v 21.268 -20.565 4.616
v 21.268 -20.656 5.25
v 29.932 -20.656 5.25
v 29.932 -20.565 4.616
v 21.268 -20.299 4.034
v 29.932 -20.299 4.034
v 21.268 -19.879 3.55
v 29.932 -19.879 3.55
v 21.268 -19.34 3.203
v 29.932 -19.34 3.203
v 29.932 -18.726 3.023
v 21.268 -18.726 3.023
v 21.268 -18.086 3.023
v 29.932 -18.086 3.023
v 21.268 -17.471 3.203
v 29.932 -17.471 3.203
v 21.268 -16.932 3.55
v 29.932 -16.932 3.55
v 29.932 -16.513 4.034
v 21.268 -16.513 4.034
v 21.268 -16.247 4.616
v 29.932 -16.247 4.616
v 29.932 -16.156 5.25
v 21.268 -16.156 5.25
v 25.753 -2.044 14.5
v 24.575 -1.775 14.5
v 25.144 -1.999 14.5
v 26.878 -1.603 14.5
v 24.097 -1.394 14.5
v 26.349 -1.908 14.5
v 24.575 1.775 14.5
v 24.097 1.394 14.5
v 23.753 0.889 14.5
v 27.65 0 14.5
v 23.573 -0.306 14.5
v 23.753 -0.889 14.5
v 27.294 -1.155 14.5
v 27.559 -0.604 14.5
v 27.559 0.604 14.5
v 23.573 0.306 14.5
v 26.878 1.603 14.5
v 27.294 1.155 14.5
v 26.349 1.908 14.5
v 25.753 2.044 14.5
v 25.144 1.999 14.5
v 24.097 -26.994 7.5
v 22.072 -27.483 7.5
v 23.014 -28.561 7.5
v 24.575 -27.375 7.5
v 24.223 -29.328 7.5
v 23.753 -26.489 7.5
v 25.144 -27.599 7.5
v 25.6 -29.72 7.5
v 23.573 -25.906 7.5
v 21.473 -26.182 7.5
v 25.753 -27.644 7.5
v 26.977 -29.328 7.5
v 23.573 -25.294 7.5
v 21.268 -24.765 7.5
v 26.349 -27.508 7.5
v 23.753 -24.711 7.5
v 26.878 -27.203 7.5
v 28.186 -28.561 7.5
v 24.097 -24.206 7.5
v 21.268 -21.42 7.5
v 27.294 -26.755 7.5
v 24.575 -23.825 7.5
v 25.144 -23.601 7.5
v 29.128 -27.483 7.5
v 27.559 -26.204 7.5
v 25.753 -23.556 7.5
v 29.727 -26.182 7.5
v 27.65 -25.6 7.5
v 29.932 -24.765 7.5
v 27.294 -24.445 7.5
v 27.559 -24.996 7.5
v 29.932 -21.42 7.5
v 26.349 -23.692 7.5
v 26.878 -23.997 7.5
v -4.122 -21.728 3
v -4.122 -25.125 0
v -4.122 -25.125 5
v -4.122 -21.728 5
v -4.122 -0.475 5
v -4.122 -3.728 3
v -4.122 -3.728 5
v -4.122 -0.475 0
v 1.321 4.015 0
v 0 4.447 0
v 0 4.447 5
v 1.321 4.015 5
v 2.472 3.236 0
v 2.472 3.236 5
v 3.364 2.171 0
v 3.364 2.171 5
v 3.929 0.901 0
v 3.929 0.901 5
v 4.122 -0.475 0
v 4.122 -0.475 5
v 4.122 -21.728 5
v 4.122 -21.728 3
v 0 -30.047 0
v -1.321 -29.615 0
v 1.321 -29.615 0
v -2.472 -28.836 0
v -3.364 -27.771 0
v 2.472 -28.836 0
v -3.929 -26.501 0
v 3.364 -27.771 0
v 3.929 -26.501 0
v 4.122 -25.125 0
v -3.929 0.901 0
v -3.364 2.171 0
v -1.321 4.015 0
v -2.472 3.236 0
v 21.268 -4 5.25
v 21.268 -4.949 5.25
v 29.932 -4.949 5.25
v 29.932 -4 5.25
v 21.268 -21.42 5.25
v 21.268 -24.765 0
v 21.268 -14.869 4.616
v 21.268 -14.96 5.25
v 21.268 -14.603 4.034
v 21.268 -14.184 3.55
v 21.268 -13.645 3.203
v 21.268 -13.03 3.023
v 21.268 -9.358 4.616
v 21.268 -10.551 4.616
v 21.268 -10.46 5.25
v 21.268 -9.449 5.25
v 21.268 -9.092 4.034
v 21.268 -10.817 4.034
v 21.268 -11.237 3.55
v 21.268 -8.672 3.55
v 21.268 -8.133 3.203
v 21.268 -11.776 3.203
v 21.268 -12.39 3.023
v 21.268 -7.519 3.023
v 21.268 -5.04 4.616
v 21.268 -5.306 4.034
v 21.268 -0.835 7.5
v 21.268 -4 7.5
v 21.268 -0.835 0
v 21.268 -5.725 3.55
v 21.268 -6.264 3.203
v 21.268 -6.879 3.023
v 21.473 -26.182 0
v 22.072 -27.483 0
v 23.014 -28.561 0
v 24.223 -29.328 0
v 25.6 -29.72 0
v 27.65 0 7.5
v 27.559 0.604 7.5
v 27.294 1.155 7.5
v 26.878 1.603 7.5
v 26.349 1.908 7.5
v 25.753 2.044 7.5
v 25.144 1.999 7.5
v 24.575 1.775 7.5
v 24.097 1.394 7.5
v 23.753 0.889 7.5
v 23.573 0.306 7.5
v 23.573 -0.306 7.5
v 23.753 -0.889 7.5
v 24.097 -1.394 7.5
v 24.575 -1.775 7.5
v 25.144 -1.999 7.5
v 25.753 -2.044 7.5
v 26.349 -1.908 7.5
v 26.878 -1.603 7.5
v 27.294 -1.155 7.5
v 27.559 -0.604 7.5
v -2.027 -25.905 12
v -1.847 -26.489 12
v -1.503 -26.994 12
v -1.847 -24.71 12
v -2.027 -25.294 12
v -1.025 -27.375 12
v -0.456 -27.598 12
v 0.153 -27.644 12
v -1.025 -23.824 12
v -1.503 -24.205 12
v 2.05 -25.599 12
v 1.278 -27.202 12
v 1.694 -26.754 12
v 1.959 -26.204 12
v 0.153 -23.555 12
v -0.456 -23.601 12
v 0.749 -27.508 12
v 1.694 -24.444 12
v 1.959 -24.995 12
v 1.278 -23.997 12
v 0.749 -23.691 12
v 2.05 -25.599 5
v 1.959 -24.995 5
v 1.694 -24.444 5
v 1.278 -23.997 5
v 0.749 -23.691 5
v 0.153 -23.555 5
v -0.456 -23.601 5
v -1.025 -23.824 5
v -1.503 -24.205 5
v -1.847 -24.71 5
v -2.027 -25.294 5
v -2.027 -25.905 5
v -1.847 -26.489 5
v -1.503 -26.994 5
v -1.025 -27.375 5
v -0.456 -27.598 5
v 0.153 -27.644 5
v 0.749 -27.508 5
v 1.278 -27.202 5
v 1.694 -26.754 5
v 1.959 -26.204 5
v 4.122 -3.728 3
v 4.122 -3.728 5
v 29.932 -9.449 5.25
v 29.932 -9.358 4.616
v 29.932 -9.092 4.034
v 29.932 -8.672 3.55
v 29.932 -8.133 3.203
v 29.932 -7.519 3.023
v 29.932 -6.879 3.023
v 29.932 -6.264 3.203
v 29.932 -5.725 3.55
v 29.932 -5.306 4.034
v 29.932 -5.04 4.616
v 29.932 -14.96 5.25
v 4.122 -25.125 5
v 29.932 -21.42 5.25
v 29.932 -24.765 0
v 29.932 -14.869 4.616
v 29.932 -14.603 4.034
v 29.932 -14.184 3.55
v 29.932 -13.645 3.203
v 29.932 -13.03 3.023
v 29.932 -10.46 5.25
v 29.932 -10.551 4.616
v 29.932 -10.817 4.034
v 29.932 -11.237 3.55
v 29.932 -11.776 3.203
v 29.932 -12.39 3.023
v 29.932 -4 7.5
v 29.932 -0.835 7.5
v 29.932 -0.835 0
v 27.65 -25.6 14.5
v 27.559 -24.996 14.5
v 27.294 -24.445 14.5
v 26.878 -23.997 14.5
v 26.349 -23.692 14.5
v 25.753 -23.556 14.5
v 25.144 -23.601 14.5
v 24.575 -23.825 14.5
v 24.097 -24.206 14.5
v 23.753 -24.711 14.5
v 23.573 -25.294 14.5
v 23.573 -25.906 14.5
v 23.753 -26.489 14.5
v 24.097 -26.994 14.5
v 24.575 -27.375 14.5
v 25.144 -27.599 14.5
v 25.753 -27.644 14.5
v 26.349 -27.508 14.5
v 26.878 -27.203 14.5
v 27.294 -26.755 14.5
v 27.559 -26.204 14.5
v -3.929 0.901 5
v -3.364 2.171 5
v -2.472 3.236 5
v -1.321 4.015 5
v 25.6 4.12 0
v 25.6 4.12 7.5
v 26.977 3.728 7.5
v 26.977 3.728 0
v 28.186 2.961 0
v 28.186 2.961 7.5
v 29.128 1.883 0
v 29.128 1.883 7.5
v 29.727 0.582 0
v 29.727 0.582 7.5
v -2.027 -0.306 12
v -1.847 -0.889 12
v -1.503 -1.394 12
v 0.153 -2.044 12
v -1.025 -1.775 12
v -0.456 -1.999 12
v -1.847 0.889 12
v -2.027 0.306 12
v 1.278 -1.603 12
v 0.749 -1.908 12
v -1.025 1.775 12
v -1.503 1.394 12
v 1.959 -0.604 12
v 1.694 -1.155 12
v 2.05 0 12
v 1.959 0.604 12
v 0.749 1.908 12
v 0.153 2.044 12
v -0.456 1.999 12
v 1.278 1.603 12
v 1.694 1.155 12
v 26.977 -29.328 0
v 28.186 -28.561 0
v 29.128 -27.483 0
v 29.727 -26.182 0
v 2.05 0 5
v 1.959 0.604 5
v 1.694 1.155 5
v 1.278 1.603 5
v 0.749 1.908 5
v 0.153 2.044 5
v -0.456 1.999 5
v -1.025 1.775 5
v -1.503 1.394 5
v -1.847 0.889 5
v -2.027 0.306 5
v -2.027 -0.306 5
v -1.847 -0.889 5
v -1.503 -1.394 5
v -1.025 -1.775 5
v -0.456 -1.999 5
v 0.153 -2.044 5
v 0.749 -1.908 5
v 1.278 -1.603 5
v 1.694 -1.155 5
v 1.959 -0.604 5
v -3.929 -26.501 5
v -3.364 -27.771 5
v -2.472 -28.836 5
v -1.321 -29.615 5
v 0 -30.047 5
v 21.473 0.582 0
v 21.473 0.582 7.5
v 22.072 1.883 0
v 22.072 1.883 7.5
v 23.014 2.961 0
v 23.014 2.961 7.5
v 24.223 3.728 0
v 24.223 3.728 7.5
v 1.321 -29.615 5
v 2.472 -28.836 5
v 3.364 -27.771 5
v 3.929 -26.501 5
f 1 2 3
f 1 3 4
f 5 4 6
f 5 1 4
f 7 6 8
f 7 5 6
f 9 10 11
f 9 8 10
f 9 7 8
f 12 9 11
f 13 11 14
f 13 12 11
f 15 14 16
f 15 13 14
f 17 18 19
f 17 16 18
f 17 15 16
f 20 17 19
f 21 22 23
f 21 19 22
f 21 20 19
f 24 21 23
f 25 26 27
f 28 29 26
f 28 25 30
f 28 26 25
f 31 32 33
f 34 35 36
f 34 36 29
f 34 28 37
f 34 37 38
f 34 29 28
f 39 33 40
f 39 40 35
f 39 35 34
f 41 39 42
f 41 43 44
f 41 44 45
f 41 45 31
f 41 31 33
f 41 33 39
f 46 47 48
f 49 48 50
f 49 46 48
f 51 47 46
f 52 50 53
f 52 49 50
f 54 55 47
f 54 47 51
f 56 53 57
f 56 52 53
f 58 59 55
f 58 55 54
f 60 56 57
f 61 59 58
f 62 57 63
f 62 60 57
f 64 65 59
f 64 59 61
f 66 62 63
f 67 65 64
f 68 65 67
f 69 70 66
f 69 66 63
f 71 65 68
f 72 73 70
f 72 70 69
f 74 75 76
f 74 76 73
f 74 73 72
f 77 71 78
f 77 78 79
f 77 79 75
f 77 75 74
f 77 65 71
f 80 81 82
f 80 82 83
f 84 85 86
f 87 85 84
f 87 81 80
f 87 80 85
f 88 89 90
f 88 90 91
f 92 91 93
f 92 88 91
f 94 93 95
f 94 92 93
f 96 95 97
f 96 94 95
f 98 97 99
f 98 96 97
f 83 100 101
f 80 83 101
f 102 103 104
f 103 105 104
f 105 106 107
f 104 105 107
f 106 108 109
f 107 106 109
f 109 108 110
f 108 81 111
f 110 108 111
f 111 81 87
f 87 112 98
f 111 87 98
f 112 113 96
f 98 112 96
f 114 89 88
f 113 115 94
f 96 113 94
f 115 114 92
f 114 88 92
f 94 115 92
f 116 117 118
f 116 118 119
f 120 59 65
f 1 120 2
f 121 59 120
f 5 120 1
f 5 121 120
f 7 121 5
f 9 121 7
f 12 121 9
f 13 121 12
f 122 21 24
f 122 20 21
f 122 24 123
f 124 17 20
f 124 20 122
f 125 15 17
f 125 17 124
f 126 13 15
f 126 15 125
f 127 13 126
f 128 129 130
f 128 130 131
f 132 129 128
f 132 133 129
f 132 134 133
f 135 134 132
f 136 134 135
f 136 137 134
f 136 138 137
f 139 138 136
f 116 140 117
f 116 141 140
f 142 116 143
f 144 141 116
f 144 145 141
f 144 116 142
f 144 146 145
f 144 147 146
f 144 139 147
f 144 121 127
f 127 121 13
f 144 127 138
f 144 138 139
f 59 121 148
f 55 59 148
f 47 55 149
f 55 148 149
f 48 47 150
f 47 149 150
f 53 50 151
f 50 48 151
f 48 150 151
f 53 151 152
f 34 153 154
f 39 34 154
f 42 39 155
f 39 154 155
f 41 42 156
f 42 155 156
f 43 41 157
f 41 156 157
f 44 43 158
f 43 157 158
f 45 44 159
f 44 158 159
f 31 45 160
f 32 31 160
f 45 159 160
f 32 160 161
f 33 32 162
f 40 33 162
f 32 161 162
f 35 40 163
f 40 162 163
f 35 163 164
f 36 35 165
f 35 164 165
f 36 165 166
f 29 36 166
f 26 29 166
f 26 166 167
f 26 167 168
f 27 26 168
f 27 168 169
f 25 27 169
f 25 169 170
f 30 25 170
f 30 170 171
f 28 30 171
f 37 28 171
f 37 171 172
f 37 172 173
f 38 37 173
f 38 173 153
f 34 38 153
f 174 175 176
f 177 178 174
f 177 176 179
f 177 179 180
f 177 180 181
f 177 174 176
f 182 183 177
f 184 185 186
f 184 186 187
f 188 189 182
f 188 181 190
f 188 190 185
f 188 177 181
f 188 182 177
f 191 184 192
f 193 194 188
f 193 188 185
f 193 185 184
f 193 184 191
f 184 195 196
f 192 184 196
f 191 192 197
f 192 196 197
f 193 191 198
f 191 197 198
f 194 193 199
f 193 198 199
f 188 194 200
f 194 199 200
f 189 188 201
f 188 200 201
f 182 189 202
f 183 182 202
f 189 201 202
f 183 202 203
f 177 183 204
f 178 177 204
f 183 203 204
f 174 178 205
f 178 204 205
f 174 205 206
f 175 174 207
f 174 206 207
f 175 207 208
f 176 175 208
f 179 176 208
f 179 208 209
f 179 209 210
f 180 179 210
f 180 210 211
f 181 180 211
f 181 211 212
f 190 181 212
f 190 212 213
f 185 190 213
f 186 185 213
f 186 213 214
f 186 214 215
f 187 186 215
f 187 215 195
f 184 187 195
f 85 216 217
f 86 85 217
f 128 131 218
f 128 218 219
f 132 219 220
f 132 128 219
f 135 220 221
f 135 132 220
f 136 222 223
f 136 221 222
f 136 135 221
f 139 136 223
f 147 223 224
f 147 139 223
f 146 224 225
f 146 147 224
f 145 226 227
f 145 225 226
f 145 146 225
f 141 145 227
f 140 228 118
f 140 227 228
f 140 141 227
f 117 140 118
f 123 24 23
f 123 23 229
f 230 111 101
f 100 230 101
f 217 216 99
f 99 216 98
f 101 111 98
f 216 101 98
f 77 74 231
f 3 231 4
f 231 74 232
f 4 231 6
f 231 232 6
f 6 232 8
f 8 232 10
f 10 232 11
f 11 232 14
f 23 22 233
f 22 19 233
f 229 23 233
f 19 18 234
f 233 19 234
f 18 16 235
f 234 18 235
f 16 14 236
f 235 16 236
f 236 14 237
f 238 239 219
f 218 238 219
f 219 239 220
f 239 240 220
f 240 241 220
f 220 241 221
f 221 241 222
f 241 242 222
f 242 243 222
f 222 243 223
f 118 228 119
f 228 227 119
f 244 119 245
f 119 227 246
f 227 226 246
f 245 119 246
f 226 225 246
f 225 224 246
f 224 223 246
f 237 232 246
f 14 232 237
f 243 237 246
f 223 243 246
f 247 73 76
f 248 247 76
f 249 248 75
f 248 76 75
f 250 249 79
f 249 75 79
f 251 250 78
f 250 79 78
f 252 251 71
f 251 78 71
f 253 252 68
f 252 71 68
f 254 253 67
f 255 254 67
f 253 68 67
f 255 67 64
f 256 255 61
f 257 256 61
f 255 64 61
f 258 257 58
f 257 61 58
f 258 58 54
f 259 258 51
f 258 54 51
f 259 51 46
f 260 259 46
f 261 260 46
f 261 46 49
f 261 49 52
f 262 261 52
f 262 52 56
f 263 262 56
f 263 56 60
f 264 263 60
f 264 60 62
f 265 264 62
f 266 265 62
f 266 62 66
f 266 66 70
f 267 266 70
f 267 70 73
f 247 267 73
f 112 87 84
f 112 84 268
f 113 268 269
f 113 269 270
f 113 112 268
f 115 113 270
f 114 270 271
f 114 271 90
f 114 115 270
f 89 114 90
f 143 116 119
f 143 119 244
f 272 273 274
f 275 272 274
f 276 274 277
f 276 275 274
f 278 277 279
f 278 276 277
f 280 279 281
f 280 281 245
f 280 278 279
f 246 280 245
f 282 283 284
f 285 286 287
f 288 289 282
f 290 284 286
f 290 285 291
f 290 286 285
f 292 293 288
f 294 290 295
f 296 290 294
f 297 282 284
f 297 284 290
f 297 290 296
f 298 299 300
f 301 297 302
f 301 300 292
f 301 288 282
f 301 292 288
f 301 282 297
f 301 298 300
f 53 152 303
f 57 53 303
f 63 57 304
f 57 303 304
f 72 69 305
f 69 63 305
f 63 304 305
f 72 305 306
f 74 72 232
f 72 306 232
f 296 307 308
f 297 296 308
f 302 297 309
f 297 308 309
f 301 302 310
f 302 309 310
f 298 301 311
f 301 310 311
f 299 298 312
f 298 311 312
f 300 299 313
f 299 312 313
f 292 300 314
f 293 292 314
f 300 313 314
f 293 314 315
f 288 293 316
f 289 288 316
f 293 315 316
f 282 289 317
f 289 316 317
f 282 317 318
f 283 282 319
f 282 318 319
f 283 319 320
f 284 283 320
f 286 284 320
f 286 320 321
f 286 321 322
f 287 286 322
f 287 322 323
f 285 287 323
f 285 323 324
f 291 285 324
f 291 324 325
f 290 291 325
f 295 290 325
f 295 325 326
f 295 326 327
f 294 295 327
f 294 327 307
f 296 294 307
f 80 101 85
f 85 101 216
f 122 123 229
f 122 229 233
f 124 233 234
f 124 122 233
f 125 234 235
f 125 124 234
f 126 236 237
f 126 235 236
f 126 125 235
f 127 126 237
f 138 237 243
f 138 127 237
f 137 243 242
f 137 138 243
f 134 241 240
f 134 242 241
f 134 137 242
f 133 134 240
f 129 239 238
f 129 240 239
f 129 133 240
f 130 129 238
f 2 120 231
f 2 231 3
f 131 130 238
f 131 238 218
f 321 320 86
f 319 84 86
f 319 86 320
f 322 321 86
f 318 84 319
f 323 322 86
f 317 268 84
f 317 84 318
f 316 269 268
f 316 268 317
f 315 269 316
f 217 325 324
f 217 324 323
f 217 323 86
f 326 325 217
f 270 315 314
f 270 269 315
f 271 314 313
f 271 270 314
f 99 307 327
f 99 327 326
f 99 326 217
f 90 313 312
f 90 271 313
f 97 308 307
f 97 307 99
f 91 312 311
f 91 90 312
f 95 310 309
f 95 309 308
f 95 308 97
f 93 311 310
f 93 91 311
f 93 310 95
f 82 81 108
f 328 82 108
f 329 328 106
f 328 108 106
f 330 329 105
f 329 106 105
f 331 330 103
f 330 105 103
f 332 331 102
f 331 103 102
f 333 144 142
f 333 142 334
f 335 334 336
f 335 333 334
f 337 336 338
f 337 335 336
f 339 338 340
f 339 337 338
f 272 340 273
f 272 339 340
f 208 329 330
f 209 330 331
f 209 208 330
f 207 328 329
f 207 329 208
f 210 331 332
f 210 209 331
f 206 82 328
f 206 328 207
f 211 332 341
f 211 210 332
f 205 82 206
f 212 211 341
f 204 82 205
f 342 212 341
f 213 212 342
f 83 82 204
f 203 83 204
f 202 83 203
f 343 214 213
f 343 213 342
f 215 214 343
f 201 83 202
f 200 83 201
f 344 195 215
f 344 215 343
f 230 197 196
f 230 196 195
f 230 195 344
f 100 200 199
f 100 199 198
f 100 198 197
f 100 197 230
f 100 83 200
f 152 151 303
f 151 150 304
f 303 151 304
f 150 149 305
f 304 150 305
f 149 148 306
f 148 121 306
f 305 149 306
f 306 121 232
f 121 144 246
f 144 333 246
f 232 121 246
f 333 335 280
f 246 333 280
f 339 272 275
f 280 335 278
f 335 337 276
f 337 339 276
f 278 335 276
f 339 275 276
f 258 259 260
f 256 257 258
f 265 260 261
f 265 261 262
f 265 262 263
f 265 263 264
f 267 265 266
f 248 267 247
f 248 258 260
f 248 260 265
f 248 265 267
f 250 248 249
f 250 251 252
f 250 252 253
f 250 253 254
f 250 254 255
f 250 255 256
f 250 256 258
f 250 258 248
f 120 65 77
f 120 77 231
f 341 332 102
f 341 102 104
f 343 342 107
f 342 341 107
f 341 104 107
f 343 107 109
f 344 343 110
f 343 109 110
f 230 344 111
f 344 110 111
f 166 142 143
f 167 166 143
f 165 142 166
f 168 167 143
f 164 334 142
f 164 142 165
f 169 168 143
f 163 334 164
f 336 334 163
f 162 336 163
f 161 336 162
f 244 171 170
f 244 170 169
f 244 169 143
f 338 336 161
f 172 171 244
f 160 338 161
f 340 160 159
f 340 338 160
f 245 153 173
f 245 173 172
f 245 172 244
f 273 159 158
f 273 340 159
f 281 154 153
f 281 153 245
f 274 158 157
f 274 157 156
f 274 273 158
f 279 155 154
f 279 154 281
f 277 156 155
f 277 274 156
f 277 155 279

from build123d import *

# Parameters (mm, degrees)
F0_W         = 8.2438504323
F0_H         = 34.6492690086
F1_DEPTH     = 5
F2_R         = 2.05
F3_DEPTH     = 12
F5_DEPTH     = 12.5
F6_T1_DEPTH  = 30
F7_W         = 8.6631612957
F7_H         = 33.9300383866
F7_R         = 2.05
F8_DEPTH     = 7.5
F9_DEPTH     = 14.5
F10_T1_DEPTH = 32.5
F12_DEPTH    = 29.9325806478


# Not quite as in the source:
# - a fillet or chamfer that OpenCascade refuses, or shapes differently, is made with other operations: its cross-section is extruded or revolved along the edge and cut away or added


with BuildPart() as f1:
    # F0 (on Top) → F1 (new body)
    with BuildSketch(Plane.XY):
        with Locations((0, -12.8)):
            Rectangle(F0_W, F0_H)
        with BuildLine():
            ThreePointArc((1.9, -25.6), (-1.3435028843, -26.9435028843), (0, -23.7))
            ThreePointArc((0, -23.7), (1.3435028843, -24.2564971157), (1.9, -25.6))
        make_face(mode=Mode.SUBTRACT)
        with BuildLine():
            ThreePointArc((0, -1.9), (-1.3435028843, 1.3435028843), (1.9, 0))
            ThreePointArc((1.9, 0), (1.3435028843, -1.3435028843), (0, -1.9))
        make_face(mode=Mode.SUBTRACT)
        with BuildLine():
            ThreePointArc((0, -1.9), (1.3435028843, -1.3435028843), (1.9, 0))
            ThreePointArc((1.9, 0), (-1.3435028843, 1.3435028843), (0, -1.9))
        make_face()
        with BuildLine():
            ThreePointArc((1.9, -25.6), (1.3435028843, -24.2564971157), (0, -23.7))
            ThreePointArc((0, -23.7), (-1.3435028843, -26.9435028843), (1.9, -25.6))
        make_face()
    extrude(amount=F1_DEPTH)

    # F2 (on Top) → F3 (join)
    with BuildSketch(Plane.XY):
        Circle(F2_R)
        with Locations((0, -25.5993018519)):
            Circle(F2_R)
    extrude(amount=F3_DEPTH)

    # F4 (on Right) → F5 (cut, symmetric)
    with BuildSketch(Plane.YZ):
        Polygon((-21.728410773, 3), (-12.728410773, 3), (-3.728410773, 3), (-3.728410773, 5), (-21.728410773, 5), align=None)
    extrude(amount=F5_DEPTH, both=True, mode=Mode.SUBTRACT)

    # F6: fillet of radius 5 on 4 edges, made by hand

    # F6_s2 → F6_t1 (cut)
    with BuildSketch(Plane.XY.offset(-12.5)):
        with BuildLine():
            ThreePointArc((-0.8780747838, 4.5246345043), (2.6574591221, 3.0601684103), (4.1219252162, -0.4753654957))
            Line((4.1219252162, -0.4753654957), (4.1219252162, 4.5246345043))
            Line((4.1219252162, 4.5246345043), (-0.8780747838, 4.5246345043))
        make_face()
        with BuildLine():
            ThreePointArc((-4.1219252162, -0.4753654957), (-2.6574591221, 3.0601684103), (0.8780747838, 4.5246345043))
            Line((0.8780747838, 4.5246345043), (-4.1219252162, 4.5246345043))
            Line((-4.1219252162, 4.5246345043), (-4.1219252162, -0.4753654957))
        make_face()
        with BuildLine():
            ThreePointArc((-4.1219252162, -25.1246345043), (-2.6574591221, -28.6601684103), (0.8780747838, -30.1246345043))
            Line((0.8780747838, -30.1246345043), (-4.1219252162, -30.1246345043))
            Line((-4.1219252162, -30.1246345043), (-4.1219252162, -25.1246345043))
        make_face()
        with BuildLine():
            ThreePointArc((-0.8780747838, -30.1246345043), (2.6574591221, -28.6601684103), (4.1219252162, -25.1246345043))
            Line((4.1219252162, -25.1246345043), (4.1219252162, -30.1246345043))
            Line((4.1219252162, -30.1246345043), (-0.8780747838, -30.1246345043))
        make_face()
    extrude(amount=F6_T1_DEPTH, mode=Mode.SUBTRACT)


with BuildPart() as f8:
    # F7 (on Top) → F8 (new body)
    with BuildSketch(Plane.XY):
        with Locations((25.6, -12.8)):
            Rectangle(F7_W, F7_H)
        with Locations((25.6, -25.6)):
            Circle(F7_R, mode=Mode.SUBTRACT)
        with Locations((25.6, 0)):
            Circle(F7_R, mode=Mode.SUBTRACT)
        with Locations((25.6, -25.6)):
            Circle(F7_R)
        with Locations((25.6, 0)):
            Circle(F7_R)
    extrude(amount=F8_DEPTH)

    # F7 (on Top) → F9 (join)
    with BuildSketch(Plane.XY):
        with Locations((25.6, 0)):
            Circle(F7_R)
        with Locations((25.6, -25.6)):
            Circle(F7_R)
    extrude(amount=F9_DEPTH)

    # F10: fillet of radius 5 on 4 edges, made by hand

    # F10_s2 → F10_t1 (cut)
    with BuildSketch(Plane.XY.offset(-12.5)):
        with BuildLine():
            ThreePointArc((24.9315806478, 4.1650191933), (28.4671145538, 2.7005530992), (29.9315806478, -0.8349808067))
            Line((29.9315806478, -0.8349808067), (29.9315806478, 4.1650191933))
            Line((29.9315806478, 4.1650191933), (24.9315806478, 4.1650191933))
        make_face()
        with BuildLine():
            ThreePointArc((24.9315806478, -29.7650191933), (28.4671145538, -28.3005530992), (29.9315806478, -24.7650191933))
            Line((29.9315806478, -24.7650191933), (29.9315806478, -29.7650191933))
            Line((29.9315806478, -29.7650191933), (24.9315806478, -29.7650191933))
        make_face()
        with BuildLine():
            ThreePointArc((21.2684193522, -24.7650191933), (22.7328854462, -28.3005530992), (26.2684193522, -29.7650191933))
            Line((26.2684193522, -29.7650191933), (21.2684193522, -29.7650191933))
            Line((21.2684193522, -29.7650191933), (21.2684193522, -24.7650191933))
        make_face()
        with BuildLine():
            ThreePointArc((21.2684193522, -0.8349808067), (22.7328854462, 2.7005530992), (26.2684193522, 4.1650191933))
            Line((26.2684193522, 4.1650191933), (21.2684193522, 4.1650191933))
            Line((21.2684193522, 4.1650191933), (21.2684193522, -0.8349808067))
        make_face()
    extrude(amount=F10_T1_DEPTH, mode=Mode.SUBTRACT)

    # F11 (on Right) → F12 (cut, through all)
    with BuildSketch(Plane.YZ):
        with BuildLine():
            Line((-4.9487714618, 5.25), (-4, 5.25))
            Line((-4, 5.25), (-4, 7.5))
            Line((-4, 7.5), (-21.4204657823, 7.5))
            Line((-21.4204657823, 7.5), (-21.4204657823, 5.25))
            Line((-21.4204657823, 5.25), (-20.6557280421, 5.25))
            ThreePointArc((-20.6557280421, 5.25), (-18.4057280421, 3), (-16.1557280421, 5.25))
            Line((-16.1557280421, 5.25), (-14.9602328911, 5.25))
            ThreePointArc((-14.9602328911, 5.25), (-12.7102328911, 3), (-10.4602328911, 5.25))
            Line((-10.4602328911, 5.25), (-9.4487714618, 5.25))
            ThreePointArc((-9.4487714618, 5.25), (-7.1987714618, 3), (-4.9487714618, 5.25))
        make_face()
    extrude(amount=F12_DEPTH, mode=Mode.SUBTRACT)


solid = Compound([f1.part, f8.part])
